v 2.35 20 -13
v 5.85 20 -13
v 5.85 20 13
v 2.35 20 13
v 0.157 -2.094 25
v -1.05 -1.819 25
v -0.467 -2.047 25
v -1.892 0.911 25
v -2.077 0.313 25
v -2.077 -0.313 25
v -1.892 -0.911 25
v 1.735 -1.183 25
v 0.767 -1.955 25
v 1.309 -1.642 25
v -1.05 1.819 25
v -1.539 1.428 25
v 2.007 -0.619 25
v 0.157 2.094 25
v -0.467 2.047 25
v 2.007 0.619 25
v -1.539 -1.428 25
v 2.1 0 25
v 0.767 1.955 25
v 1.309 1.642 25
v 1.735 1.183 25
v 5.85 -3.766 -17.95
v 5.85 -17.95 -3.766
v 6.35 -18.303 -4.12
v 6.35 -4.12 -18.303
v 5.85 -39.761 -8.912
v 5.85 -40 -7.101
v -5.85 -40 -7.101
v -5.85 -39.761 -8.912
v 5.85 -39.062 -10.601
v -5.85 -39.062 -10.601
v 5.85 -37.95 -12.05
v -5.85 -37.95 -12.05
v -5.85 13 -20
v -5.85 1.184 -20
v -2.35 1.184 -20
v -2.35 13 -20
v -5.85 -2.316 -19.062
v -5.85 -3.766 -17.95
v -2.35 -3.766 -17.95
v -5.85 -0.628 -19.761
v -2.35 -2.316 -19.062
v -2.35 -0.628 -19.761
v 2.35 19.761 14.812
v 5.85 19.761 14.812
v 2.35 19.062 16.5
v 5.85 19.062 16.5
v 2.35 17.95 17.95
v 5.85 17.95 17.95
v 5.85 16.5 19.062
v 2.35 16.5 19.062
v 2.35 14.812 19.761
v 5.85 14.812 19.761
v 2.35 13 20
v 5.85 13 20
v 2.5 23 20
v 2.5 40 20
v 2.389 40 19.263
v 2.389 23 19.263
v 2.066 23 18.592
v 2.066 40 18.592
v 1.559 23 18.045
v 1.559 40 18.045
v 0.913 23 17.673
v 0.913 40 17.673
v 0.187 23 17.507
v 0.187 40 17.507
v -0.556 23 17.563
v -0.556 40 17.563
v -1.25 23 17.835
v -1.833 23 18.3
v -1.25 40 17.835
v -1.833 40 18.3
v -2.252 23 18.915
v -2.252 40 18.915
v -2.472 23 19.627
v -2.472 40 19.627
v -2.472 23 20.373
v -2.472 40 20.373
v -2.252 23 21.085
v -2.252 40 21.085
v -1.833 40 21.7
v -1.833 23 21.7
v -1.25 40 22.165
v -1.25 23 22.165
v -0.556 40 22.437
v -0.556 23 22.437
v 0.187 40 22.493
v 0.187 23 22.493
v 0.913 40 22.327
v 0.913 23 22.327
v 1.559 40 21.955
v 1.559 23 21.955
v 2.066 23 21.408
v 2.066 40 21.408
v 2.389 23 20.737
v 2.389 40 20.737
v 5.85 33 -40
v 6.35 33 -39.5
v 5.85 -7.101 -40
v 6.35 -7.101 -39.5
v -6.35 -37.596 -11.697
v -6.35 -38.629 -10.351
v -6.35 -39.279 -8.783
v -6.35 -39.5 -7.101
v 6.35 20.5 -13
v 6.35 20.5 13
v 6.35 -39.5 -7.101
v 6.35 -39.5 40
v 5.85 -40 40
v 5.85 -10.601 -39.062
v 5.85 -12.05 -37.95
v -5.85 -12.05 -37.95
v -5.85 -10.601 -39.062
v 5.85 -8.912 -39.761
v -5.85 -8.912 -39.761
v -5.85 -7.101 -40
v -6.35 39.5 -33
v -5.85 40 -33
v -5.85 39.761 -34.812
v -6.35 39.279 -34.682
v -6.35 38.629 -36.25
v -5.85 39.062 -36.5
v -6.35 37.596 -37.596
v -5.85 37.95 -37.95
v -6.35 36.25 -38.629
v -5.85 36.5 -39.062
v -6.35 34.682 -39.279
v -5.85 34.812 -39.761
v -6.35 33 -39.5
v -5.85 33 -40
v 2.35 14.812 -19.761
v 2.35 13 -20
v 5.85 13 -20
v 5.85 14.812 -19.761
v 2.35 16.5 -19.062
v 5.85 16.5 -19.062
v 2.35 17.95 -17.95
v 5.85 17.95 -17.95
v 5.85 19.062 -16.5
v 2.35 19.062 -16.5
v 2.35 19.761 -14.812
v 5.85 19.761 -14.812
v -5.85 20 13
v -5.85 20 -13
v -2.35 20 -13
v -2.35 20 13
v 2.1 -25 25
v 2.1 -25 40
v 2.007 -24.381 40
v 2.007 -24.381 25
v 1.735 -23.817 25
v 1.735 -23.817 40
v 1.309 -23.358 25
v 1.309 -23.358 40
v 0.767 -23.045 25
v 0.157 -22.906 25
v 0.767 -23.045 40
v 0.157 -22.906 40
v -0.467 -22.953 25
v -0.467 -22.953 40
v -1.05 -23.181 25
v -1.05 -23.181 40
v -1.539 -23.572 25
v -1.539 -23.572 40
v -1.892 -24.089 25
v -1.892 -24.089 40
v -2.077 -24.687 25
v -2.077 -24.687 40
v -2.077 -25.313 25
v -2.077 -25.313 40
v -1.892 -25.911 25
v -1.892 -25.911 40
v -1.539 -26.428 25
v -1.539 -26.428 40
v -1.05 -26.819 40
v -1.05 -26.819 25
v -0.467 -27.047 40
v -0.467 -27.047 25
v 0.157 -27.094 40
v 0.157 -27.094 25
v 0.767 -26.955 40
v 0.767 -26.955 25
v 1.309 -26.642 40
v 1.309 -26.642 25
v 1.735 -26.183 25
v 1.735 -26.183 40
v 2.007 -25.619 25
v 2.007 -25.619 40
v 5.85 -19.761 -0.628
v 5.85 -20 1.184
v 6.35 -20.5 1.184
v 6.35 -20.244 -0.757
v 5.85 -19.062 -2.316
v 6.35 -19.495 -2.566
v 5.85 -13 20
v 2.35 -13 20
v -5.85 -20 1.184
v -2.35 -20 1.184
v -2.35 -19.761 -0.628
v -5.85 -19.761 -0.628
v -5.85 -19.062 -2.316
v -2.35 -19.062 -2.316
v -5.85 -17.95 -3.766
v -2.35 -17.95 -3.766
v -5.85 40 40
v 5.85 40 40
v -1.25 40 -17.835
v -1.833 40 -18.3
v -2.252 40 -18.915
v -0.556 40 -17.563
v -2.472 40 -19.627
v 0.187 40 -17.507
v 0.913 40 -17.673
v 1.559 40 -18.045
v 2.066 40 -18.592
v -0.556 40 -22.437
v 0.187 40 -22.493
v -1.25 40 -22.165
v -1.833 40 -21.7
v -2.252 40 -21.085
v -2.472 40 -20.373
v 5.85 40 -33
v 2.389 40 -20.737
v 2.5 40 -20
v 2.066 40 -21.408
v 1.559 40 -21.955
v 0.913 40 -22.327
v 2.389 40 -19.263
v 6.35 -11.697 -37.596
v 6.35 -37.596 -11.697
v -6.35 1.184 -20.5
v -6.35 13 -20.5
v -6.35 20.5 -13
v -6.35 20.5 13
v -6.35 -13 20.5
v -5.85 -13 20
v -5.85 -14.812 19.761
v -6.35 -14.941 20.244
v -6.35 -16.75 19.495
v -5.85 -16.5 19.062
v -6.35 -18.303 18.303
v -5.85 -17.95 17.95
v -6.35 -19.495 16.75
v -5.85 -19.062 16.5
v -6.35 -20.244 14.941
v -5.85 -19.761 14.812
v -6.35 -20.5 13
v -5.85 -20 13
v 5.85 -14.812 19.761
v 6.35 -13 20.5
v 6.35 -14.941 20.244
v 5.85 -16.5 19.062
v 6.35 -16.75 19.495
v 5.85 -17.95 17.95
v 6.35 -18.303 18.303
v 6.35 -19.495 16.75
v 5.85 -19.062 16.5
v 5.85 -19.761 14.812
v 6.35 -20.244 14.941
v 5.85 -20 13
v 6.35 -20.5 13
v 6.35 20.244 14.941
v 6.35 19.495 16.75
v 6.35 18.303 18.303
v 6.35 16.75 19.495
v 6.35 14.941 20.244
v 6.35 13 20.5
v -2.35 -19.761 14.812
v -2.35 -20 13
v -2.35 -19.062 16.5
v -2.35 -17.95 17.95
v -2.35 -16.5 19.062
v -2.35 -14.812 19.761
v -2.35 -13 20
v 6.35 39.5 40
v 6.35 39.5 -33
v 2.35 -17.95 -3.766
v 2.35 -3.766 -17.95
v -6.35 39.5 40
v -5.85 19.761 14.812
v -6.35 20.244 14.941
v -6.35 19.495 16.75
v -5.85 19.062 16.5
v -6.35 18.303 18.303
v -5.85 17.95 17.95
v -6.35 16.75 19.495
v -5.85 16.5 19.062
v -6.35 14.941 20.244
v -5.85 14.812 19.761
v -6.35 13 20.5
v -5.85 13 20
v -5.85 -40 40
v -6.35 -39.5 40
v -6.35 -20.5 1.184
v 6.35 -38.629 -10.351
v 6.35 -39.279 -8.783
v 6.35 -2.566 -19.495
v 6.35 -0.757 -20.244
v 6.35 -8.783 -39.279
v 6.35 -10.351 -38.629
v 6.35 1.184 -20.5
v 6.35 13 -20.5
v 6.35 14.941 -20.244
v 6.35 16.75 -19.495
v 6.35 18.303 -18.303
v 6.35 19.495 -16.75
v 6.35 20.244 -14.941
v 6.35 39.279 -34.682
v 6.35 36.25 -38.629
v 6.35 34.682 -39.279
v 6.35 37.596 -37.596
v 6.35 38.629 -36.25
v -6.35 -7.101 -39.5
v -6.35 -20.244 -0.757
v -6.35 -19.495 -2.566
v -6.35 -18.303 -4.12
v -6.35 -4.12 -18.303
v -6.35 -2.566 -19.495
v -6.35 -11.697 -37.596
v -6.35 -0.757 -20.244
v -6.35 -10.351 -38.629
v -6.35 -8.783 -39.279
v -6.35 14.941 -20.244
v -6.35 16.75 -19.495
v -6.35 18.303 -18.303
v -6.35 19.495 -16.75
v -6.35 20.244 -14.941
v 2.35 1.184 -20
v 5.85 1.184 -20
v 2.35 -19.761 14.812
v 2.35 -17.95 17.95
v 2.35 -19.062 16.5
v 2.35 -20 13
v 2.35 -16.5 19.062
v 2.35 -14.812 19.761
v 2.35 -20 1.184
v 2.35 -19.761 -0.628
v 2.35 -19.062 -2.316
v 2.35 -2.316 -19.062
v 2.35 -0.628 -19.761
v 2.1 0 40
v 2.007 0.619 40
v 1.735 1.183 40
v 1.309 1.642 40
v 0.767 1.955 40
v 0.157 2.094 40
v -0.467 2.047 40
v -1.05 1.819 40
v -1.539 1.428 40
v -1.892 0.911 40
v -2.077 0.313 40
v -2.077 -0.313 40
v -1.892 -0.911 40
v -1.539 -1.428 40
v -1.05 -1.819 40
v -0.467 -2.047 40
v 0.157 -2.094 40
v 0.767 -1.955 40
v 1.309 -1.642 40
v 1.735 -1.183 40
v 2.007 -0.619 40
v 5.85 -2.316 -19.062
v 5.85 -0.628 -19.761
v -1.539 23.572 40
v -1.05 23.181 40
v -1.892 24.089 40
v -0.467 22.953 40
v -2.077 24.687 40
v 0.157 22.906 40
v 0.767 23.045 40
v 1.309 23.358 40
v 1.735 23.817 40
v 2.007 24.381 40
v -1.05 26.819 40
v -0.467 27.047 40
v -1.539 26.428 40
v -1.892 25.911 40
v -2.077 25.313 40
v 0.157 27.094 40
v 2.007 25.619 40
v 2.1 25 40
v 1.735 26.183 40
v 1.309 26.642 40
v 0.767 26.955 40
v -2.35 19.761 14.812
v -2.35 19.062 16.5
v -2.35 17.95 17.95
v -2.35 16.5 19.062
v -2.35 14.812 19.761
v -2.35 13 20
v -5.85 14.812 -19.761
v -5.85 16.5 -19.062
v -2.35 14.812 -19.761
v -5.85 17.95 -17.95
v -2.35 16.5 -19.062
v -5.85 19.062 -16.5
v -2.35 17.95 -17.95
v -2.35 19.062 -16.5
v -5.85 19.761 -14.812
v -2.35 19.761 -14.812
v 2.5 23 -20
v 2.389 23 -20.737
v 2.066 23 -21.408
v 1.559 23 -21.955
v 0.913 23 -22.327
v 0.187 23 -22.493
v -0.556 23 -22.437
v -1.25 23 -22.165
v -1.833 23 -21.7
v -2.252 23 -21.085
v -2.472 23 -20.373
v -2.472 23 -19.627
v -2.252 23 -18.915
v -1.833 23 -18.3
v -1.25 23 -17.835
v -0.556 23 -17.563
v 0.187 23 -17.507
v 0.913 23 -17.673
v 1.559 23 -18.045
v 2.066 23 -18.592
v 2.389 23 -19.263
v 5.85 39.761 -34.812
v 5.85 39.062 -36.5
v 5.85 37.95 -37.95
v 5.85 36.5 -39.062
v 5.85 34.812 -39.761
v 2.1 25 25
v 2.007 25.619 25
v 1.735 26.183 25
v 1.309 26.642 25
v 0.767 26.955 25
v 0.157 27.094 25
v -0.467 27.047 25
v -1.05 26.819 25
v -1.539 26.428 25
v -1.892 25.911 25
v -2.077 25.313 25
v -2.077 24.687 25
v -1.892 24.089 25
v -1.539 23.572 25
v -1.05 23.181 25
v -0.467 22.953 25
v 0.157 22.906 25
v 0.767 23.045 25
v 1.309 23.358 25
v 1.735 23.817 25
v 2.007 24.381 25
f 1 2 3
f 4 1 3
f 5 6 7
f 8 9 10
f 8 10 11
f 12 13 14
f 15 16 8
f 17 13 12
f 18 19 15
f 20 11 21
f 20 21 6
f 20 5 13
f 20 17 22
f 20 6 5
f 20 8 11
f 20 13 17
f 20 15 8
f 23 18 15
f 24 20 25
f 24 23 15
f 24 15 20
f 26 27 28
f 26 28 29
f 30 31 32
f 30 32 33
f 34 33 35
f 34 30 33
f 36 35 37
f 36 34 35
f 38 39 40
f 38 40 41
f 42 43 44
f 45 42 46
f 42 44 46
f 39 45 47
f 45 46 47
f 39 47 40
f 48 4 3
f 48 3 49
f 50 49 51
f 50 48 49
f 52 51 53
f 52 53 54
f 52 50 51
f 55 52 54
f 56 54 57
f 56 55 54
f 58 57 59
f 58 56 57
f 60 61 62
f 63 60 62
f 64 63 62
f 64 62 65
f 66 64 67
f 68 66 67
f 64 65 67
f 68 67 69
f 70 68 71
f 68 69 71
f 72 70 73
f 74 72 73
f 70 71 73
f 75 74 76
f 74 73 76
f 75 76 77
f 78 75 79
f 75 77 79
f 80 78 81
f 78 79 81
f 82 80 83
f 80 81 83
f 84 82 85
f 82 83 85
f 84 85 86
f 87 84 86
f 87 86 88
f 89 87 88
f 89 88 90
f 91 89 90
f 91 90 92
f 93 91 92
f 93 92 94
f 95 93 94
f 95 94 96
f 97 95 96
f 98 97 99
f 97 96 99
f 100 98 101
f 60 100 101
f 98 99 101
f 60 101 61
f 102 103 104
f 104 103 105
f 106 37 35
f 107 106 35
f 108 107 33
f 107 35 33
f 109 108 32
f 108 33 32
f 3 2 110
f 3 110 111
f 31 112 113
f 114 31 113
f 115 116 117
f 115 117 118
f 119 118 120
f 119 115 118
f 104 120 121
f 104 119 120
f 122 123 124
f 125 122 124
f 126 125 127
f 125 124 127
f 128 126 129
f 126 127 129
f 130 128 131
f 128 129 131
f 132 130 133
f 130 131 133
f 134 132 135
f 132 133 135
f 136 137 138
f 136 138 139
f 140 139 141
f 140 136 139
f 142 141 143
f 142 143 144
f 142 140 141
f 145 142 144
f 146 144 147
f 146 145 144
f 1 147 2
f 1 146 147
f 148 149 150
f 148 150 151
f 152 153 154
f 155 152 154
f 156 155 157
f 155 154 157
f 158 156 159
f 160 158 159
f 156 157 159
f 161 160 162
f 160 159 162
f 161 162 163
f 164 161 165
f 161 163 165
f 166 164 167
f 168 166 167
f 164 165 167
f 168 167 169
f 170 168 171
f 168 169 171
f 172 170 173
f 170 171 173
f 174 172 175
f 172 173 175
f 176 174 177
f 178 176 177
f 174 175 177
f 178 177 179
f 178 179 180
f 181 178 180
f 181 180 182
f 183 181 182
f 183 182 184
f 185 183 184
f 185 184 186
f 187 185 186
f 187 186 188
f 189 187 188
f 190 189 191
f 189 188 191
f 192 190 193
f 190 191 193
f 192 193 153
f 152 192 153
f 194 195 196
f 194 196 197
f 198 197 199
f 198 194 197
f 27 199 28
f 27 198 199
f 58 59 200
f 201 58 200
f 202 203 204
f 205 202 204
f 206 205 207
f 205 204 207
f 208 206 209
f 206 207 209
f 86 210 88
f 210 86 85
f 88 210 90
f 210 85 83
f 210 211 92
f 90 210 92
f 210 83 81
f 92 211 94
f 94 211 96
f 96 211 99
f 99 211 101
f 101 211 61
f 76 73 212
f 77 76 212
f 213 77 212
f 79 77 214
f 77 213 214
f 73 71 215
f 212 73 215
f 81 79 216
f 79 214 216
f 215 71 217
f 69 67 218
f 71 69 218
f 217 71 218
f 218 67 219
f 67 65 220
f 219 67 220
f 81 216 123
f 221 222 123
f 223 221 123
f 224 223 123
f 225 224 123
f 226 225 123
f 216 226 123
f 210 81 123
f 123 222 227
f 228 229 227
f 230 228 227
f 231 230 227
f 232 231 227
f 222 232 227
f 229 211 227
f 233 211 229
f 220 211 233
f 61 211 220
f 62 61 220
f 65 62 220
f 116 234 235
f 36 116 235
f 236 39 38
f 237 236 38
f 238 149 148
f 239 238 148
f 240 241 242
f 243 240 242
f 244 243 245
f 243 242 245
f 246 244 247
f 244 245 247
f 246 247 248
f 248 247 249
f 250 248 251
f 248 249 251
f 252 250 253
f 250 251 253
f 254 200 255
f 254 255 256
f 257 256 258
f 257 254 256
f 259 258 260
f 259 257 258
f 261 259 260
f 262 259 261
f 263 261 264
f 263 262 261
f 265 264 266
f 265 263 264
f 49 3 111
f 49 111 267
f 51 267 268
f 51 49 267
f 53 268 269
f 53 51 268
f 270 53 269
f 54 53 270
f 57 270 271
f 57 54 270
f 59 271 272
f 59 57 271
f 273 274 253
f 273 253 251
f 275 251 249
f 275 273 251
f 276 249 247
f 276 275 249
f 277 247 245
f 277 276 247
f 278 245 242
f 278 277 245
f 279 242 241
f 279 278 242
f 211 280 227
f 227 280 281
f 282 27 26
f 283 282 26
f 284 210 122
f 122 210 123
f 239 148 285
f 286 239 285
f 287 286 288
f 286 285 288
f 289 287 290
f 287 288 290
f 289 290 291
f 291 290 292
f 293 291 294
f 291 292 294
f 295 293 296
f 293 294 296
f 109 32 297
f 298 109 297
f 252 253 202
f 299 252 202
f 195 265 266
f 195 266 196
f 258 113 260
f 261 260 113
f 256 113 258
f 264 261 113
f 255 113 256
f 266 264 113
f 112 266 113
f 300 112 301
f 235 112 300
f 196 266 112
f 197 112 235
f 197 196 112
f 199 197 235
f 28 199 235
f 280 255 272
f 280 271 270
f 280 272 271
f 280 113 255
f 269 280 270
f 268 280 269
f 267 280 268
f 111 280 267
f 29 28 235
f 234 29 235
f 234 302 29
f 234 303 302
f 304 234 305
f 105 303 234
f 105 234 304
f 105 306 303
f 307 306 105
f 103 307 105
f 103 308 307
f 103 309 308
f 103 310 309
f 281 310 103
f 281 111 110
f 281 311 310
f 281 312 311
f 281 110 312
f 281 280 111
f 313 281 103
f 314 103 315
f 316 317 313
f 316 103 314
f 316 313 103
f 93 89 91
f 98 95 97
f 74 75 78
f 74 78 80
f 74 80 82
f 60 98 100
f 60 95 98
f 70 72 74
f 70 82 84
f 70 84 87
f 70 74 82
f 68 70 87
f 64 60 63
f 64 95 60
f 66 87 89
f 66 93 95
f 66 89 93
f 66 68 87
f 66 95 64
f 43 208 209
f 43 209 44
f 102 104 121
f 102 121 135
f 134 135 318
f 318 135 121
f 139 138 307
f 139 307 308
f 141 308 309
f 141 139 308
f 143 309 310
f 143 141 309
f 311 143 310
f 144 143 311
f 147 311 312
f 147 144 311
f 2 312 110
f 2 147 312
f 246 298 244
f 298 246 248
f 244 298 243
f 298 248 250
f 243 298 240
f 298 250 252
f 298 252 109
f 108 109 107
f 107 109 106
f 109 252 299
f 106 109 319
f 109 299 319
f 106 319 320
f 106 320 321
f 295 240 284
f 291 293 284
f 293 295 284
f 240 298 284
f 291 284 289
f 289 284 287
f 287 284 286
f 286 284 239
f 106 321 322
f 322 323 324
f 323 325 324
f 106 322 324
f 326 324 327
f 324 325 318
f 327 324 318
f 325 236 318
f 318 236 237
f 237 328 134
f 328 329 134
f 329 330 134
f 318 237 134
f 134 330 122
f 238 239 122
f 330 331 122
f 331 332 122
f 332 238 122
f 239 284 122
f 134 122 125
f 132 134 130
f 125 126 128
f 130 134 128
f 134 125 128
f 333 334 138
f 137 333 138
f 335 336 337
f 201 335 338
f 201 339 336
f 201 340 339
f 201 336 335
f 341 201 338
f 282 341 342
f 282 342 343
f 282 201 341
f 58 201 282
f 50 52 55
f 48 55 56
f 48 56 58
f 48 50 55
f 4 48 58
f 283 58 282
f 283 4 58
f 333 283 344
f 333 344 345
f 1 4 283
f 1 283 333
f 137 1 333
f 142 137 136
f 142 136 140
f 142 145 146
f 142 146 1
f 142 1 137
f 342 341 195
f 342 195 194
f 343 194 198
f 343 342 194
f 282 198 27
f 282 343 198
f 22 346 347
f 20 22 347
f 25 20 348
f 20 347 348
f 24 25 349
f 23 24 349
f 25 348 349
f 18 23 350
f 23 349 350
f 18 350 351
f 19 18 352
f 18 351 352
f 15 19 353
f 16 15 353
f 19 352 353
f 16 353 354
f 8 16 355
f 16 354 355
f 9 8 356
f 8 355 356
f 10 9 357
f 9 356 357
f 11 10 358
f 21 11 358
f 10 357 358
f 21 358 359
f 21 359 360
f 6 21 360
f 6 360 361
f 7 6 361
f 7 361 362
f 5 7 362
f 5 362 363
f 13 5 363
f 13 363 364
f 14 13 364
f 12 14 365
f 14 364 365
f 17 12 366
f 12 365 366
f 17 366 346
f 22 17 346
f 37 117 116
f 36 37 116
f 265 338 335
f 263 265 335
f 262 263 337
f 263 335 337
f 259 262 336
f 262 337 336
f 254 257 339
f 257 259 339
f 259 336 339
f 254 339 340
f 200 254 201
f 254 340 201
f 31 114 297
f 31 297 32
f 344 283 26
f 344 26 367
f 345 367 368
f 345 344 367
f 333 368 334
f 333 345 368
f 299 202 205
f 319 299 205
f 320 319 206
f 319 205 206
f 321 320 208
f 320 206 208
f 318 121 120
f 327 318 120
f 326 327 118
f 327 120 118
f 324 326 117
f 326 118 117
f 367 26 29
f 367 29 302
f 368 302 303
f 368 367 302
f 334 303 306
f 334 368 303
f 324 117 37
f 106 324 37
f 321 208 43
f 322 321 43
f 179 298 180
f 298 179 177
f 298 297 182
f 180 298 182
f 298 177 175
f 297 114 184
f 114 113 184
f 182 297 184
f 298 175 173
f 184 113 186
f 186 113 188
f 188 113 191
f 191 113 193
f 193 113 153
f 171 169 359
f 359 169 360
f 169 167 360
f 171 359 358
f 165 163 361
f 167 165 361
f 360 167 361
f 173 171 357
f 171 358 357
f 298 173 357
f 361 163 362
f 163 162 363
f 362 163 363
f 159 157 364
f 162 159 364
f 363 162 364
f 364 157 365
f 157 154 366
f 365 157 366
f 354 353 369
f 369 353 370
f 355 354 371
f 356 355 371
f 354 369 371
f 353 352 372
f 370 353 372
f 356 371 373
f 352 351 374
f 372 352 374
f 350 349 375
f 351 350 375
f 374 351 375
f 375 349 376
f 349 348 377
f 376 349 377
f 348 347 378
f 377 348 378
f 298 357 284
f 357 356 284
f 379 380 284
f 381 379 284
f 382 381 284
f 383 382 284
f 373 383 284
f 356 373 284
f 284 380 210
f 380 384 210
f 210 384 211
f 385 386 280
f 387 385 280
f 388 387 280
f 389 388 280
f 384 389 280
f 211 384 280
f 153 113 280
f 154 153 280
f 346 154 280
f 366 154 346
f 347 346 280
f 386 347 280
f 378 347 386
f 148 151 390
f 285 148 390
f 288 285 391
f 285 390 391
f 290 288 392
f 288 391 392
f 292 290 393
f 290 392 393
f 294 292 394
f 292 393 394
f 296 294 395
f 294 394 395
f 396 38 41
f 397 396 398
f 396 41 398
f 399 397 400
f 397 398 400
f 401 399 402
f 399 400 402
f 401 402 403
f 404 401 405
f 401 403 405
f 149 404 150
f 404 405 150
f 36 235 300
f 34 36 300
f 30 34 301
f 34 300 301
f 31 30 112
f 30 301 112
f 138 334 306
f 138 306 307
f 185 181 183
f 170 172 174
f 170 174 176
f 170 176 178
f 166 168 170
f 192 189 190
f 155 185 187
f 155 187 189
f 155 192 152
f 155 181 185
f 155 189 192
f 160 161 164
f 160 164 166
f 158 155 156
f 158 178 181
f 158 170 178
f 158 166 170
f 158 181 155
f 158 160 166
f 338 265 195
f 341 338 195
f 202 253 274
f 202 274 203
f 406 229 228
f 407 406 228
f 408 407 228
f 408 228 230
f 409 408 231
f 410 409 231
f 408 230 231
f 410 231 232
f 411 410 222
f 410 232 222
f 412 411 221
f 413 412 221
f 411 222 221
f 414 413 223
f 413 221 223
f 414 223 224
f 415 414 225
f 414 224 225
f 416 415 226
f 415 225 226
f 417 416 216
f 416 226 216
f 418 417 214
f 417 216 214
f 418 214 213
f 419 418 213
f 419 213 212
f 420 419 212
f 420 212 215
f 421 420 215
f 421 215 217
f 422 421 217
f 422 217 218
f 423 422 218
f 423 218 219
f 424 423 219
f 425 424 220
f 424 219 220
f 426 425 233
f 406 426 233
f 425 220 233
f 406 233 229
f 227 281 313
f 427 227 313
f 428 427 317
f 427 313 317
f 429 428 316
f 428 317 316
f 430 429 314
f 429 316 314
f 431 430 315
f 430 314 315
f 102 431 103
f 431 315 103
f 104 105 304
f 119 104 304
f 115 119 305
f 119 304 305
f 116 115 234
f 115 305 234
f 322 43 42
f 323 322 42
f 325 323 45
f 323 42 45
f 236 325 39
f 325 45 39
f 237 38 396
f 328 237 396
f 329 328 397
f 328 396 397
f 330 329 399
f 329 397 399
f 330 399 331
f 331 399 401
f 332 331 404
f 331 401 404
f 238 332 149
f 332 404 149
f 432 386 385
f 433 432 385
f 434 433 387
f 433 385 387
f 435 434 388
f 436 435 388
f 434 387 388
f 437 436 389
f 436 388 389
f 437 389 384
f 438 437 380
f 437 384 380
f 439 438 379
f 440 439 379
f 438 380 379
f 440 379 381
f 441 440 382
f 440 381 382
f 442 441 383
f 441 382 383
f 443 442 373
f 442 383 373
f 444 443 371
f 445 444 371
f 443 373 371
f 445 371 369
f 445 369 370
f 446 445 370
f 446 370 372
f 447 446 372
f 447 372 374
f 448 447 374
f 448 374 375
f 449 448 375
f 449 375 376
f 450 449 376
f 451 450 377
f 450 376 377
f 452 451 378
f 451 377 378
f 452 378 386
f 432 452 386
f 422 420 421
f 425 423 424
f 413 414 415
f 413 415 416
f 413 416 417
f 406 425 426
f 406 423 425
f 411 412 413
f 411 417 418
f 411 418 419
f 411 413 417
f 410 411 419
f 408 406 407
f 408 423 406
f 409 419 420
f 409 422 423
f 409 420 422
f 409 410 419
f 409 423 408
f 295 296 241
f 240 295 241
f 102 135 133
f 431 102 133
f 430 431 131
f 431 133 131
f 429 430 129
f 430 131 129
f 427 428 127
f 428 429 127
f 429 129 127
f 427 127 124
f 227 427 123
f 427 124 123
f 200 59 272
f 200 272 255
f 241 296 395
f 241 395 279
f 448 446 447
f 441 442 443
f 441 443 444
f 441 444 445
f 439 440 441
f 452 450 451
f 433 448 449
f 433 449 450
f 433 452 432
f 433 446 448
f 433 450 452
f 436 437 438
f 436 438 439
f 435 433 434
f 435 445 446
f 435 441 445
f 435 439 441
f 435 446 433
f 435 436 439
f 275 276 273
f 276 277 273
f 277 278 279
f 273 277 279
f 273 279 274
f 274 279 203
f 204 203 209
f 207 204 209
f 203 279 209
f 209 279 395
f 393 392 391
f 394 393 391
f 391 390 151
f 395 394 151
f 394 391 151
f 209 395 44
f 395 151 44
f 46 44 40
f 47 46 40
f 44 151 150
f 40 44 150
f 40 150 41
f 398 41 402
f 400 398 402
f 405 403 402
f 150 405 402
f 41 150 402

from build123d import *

# Parameters (mm, degrees)
SKETCH1_W            = 80
SKETCH1_H            = 80
BOSS_EXTRUDE1_DEPTH  = 6.35
CHAMFER1_SIZE        = 30
SKETCH2_R            = 2.5
CUT_EXTRUDE1_DEPTH   = 17
SKETCH3_R            = 2.1
CUT_EXTRUDE2_DEPTH   = 15
CUT_EXTRUDE3_DEPTH   = 4
FILLET1_R            = 7
FILLET1_OF_MIRROR2_R = 7
FILLET2_R            = 7
CHAMFER2_SIZE        = 0.5


with BuildPart() as part:
    # Sketch1 → Boss-Extrude1 (new body, symmetric)
    with BuildSketch(Plane(origin=(0, 0, 0), x_dir=(0, 0, -1), z_dir=(1, 0, 0))):
        Rectangle(SKETCH1_W, SKETCH1_H)
    extrude(amount=BOSS_EXTRUDE1_DEPTH, both=True)

    # Chamfer1
    chamfer1_edges = [part.edges().sort_by_distance(p)[0] for p in [
        (0, -40, -40),
    ]]
    chamfer(chamfer1_edges, length=CHAMFER1_SIZE)

    # Sketch2 → Cut-Extrude1 (cut)
    with BuildSketch(Plane(origin=(0, 40, 0), x_dir=(1, 0, 0), z_dir=(0, 1, 0))):
        with Locations((0, 20)):
            Circle(SKETCH2_R)
        with Locations((0, -20)):
            Circle(SKETCH2_R)
    extrude(amount=-CUT_EXTRUDE1_DEPTH, mode=Mode.SUBTRACT)

    # Sketch3 → Cut-Extrude2 (cut)
    with BuildSketch(Plane.XY.offset(40)):
        with Locations((0, 25)):
            Circle(SKETCH3_R)
        with Locations((0, -25)):
            Circle(SKETCH3_R)
        Circle(SKETCH3_R)
    extrude(amount=-CUT_EXTRUDE2_DEPTH, mode=Mode.SUBTRACT)

    # Sketch4 → Cut-Extrude3 (cut)
    with BuildSketch(Plane(origin=(6.35, 0, 0), x_dir=(0, 0, -1), z_dir=(1, 0, 0))):
        Polygon((-20, -20), (1.715728753, -20), (20, -1.715728753), (20, 20), (-20, 20), align=None)
    cut_extrude3 = extrude(amount=-CUT_EXTRUDE3_DEPTH, mode=Mode.SUBTRACT)

    # Fillet1
    fillet1_edges = [part.edges().sort_by_distance(p)[0] for p in [
        (4.35, -20, 20),
        (4.35, 20, 20),
        (4.35, 20, -20),
        (4.35, -1.715728753, -20),
        (4.35, -20, -1.715728753),
    ]]
    fillet(fillet1_edges, radius=FILLET1_R)

    # Mirror2: Cut-Extrude3 across plane
    add(cut_extrude3.mirror(Plane(origin=(0, 0, 0), x_dir=(0, 0, 1), z_dir=(1, 0, 0))), mode=Mode.SUBTRACT)

    # Fillet1 of Mirror2
    fillet1_of_mirror2_edges = [part.edges().sort_by_distance(p)[0] for p in [
        (-4.35, -20, 20),
        (-4.35, 20, 20),
        (-4.35, 20, -20),
        (-4.35, -1.715728753, -20),
        (-4.35, -20, -1.715728753),
    ]]
    fillet(fillet1_of_mirror2_edges, radius=FILLET1_OF_MIRROR2_R)

    # Fillet2
    fillet2_edges = [part.edges().sort_by_distance(p)[0] for p in [
        (0, -10, -40),
        (0, -40, -10),
        (0, 40, -40),
    ]]
    fillet(fillet2_edges, radius=FILLET2_R)

    # Chamfer2
    chamfer2_edges = [part.edges().sort_by_distance(p)[0] for p in [
        (-6.35, 0, 20),
        (-6.35, -20, 7.091883092),
        (-6.35, -10.857864376, -10.857864376),
        (-6.35, 7.091883092, -20),
        (-6.35, 20, 0),
        (-6.35, -17.949747468, 17.949747468),
        (-6.35, -19.467156728, -1.495017842),
        (-6.35, 17.949747468, -17.949747468),
        (-6.35, 17.949747468, 17.949747468),
        (-6.35, -1.495017842, -19.467156728),
        (6.35, -25, -25),
        (6.35, 12.949747468, -40),
        (6.35, 40, 3.5),
        (6.35, 37.949747468, -37.949747468),
        (6.35, -9.77928909, -39.467156728),
        (6.35, -39.467156728, -9.77928909),
        (-6.35, -25, -25),
        (-6.35, 12.949747468, -40),
        (-6.35, 40, 3.5),
        (-6.35, 37.949747468, -37.949747468),
        (-6.35, -9.77928909, -39.467156728),
        (-6.35, -39.467156728, -9.77928909),
        (6.35, -20, 7.091883092),
        (-6.35, -40, 16.449747468),
        (6.35, 0, 20),
        (6.35, -10.857864376, -10.857864376),
        (6.35, 20, 0),
        (6.35, 7.091883092, -20),
        (6.35, -17.949747468, 17.949747468),
        (6.35, -19.467156728, -1.495017842),
        (6.35, 17.949747468, -17.949747468),
        (6.35, 17.949747468, 17.949747468),
        (6.35, -1.495017842, -19.467156728),
        (6.35, -40, 16.449747468),
    ]]
    chamfer(chamfer2_edges, length=CHAMFER2_SIZE)


solid = part.part
